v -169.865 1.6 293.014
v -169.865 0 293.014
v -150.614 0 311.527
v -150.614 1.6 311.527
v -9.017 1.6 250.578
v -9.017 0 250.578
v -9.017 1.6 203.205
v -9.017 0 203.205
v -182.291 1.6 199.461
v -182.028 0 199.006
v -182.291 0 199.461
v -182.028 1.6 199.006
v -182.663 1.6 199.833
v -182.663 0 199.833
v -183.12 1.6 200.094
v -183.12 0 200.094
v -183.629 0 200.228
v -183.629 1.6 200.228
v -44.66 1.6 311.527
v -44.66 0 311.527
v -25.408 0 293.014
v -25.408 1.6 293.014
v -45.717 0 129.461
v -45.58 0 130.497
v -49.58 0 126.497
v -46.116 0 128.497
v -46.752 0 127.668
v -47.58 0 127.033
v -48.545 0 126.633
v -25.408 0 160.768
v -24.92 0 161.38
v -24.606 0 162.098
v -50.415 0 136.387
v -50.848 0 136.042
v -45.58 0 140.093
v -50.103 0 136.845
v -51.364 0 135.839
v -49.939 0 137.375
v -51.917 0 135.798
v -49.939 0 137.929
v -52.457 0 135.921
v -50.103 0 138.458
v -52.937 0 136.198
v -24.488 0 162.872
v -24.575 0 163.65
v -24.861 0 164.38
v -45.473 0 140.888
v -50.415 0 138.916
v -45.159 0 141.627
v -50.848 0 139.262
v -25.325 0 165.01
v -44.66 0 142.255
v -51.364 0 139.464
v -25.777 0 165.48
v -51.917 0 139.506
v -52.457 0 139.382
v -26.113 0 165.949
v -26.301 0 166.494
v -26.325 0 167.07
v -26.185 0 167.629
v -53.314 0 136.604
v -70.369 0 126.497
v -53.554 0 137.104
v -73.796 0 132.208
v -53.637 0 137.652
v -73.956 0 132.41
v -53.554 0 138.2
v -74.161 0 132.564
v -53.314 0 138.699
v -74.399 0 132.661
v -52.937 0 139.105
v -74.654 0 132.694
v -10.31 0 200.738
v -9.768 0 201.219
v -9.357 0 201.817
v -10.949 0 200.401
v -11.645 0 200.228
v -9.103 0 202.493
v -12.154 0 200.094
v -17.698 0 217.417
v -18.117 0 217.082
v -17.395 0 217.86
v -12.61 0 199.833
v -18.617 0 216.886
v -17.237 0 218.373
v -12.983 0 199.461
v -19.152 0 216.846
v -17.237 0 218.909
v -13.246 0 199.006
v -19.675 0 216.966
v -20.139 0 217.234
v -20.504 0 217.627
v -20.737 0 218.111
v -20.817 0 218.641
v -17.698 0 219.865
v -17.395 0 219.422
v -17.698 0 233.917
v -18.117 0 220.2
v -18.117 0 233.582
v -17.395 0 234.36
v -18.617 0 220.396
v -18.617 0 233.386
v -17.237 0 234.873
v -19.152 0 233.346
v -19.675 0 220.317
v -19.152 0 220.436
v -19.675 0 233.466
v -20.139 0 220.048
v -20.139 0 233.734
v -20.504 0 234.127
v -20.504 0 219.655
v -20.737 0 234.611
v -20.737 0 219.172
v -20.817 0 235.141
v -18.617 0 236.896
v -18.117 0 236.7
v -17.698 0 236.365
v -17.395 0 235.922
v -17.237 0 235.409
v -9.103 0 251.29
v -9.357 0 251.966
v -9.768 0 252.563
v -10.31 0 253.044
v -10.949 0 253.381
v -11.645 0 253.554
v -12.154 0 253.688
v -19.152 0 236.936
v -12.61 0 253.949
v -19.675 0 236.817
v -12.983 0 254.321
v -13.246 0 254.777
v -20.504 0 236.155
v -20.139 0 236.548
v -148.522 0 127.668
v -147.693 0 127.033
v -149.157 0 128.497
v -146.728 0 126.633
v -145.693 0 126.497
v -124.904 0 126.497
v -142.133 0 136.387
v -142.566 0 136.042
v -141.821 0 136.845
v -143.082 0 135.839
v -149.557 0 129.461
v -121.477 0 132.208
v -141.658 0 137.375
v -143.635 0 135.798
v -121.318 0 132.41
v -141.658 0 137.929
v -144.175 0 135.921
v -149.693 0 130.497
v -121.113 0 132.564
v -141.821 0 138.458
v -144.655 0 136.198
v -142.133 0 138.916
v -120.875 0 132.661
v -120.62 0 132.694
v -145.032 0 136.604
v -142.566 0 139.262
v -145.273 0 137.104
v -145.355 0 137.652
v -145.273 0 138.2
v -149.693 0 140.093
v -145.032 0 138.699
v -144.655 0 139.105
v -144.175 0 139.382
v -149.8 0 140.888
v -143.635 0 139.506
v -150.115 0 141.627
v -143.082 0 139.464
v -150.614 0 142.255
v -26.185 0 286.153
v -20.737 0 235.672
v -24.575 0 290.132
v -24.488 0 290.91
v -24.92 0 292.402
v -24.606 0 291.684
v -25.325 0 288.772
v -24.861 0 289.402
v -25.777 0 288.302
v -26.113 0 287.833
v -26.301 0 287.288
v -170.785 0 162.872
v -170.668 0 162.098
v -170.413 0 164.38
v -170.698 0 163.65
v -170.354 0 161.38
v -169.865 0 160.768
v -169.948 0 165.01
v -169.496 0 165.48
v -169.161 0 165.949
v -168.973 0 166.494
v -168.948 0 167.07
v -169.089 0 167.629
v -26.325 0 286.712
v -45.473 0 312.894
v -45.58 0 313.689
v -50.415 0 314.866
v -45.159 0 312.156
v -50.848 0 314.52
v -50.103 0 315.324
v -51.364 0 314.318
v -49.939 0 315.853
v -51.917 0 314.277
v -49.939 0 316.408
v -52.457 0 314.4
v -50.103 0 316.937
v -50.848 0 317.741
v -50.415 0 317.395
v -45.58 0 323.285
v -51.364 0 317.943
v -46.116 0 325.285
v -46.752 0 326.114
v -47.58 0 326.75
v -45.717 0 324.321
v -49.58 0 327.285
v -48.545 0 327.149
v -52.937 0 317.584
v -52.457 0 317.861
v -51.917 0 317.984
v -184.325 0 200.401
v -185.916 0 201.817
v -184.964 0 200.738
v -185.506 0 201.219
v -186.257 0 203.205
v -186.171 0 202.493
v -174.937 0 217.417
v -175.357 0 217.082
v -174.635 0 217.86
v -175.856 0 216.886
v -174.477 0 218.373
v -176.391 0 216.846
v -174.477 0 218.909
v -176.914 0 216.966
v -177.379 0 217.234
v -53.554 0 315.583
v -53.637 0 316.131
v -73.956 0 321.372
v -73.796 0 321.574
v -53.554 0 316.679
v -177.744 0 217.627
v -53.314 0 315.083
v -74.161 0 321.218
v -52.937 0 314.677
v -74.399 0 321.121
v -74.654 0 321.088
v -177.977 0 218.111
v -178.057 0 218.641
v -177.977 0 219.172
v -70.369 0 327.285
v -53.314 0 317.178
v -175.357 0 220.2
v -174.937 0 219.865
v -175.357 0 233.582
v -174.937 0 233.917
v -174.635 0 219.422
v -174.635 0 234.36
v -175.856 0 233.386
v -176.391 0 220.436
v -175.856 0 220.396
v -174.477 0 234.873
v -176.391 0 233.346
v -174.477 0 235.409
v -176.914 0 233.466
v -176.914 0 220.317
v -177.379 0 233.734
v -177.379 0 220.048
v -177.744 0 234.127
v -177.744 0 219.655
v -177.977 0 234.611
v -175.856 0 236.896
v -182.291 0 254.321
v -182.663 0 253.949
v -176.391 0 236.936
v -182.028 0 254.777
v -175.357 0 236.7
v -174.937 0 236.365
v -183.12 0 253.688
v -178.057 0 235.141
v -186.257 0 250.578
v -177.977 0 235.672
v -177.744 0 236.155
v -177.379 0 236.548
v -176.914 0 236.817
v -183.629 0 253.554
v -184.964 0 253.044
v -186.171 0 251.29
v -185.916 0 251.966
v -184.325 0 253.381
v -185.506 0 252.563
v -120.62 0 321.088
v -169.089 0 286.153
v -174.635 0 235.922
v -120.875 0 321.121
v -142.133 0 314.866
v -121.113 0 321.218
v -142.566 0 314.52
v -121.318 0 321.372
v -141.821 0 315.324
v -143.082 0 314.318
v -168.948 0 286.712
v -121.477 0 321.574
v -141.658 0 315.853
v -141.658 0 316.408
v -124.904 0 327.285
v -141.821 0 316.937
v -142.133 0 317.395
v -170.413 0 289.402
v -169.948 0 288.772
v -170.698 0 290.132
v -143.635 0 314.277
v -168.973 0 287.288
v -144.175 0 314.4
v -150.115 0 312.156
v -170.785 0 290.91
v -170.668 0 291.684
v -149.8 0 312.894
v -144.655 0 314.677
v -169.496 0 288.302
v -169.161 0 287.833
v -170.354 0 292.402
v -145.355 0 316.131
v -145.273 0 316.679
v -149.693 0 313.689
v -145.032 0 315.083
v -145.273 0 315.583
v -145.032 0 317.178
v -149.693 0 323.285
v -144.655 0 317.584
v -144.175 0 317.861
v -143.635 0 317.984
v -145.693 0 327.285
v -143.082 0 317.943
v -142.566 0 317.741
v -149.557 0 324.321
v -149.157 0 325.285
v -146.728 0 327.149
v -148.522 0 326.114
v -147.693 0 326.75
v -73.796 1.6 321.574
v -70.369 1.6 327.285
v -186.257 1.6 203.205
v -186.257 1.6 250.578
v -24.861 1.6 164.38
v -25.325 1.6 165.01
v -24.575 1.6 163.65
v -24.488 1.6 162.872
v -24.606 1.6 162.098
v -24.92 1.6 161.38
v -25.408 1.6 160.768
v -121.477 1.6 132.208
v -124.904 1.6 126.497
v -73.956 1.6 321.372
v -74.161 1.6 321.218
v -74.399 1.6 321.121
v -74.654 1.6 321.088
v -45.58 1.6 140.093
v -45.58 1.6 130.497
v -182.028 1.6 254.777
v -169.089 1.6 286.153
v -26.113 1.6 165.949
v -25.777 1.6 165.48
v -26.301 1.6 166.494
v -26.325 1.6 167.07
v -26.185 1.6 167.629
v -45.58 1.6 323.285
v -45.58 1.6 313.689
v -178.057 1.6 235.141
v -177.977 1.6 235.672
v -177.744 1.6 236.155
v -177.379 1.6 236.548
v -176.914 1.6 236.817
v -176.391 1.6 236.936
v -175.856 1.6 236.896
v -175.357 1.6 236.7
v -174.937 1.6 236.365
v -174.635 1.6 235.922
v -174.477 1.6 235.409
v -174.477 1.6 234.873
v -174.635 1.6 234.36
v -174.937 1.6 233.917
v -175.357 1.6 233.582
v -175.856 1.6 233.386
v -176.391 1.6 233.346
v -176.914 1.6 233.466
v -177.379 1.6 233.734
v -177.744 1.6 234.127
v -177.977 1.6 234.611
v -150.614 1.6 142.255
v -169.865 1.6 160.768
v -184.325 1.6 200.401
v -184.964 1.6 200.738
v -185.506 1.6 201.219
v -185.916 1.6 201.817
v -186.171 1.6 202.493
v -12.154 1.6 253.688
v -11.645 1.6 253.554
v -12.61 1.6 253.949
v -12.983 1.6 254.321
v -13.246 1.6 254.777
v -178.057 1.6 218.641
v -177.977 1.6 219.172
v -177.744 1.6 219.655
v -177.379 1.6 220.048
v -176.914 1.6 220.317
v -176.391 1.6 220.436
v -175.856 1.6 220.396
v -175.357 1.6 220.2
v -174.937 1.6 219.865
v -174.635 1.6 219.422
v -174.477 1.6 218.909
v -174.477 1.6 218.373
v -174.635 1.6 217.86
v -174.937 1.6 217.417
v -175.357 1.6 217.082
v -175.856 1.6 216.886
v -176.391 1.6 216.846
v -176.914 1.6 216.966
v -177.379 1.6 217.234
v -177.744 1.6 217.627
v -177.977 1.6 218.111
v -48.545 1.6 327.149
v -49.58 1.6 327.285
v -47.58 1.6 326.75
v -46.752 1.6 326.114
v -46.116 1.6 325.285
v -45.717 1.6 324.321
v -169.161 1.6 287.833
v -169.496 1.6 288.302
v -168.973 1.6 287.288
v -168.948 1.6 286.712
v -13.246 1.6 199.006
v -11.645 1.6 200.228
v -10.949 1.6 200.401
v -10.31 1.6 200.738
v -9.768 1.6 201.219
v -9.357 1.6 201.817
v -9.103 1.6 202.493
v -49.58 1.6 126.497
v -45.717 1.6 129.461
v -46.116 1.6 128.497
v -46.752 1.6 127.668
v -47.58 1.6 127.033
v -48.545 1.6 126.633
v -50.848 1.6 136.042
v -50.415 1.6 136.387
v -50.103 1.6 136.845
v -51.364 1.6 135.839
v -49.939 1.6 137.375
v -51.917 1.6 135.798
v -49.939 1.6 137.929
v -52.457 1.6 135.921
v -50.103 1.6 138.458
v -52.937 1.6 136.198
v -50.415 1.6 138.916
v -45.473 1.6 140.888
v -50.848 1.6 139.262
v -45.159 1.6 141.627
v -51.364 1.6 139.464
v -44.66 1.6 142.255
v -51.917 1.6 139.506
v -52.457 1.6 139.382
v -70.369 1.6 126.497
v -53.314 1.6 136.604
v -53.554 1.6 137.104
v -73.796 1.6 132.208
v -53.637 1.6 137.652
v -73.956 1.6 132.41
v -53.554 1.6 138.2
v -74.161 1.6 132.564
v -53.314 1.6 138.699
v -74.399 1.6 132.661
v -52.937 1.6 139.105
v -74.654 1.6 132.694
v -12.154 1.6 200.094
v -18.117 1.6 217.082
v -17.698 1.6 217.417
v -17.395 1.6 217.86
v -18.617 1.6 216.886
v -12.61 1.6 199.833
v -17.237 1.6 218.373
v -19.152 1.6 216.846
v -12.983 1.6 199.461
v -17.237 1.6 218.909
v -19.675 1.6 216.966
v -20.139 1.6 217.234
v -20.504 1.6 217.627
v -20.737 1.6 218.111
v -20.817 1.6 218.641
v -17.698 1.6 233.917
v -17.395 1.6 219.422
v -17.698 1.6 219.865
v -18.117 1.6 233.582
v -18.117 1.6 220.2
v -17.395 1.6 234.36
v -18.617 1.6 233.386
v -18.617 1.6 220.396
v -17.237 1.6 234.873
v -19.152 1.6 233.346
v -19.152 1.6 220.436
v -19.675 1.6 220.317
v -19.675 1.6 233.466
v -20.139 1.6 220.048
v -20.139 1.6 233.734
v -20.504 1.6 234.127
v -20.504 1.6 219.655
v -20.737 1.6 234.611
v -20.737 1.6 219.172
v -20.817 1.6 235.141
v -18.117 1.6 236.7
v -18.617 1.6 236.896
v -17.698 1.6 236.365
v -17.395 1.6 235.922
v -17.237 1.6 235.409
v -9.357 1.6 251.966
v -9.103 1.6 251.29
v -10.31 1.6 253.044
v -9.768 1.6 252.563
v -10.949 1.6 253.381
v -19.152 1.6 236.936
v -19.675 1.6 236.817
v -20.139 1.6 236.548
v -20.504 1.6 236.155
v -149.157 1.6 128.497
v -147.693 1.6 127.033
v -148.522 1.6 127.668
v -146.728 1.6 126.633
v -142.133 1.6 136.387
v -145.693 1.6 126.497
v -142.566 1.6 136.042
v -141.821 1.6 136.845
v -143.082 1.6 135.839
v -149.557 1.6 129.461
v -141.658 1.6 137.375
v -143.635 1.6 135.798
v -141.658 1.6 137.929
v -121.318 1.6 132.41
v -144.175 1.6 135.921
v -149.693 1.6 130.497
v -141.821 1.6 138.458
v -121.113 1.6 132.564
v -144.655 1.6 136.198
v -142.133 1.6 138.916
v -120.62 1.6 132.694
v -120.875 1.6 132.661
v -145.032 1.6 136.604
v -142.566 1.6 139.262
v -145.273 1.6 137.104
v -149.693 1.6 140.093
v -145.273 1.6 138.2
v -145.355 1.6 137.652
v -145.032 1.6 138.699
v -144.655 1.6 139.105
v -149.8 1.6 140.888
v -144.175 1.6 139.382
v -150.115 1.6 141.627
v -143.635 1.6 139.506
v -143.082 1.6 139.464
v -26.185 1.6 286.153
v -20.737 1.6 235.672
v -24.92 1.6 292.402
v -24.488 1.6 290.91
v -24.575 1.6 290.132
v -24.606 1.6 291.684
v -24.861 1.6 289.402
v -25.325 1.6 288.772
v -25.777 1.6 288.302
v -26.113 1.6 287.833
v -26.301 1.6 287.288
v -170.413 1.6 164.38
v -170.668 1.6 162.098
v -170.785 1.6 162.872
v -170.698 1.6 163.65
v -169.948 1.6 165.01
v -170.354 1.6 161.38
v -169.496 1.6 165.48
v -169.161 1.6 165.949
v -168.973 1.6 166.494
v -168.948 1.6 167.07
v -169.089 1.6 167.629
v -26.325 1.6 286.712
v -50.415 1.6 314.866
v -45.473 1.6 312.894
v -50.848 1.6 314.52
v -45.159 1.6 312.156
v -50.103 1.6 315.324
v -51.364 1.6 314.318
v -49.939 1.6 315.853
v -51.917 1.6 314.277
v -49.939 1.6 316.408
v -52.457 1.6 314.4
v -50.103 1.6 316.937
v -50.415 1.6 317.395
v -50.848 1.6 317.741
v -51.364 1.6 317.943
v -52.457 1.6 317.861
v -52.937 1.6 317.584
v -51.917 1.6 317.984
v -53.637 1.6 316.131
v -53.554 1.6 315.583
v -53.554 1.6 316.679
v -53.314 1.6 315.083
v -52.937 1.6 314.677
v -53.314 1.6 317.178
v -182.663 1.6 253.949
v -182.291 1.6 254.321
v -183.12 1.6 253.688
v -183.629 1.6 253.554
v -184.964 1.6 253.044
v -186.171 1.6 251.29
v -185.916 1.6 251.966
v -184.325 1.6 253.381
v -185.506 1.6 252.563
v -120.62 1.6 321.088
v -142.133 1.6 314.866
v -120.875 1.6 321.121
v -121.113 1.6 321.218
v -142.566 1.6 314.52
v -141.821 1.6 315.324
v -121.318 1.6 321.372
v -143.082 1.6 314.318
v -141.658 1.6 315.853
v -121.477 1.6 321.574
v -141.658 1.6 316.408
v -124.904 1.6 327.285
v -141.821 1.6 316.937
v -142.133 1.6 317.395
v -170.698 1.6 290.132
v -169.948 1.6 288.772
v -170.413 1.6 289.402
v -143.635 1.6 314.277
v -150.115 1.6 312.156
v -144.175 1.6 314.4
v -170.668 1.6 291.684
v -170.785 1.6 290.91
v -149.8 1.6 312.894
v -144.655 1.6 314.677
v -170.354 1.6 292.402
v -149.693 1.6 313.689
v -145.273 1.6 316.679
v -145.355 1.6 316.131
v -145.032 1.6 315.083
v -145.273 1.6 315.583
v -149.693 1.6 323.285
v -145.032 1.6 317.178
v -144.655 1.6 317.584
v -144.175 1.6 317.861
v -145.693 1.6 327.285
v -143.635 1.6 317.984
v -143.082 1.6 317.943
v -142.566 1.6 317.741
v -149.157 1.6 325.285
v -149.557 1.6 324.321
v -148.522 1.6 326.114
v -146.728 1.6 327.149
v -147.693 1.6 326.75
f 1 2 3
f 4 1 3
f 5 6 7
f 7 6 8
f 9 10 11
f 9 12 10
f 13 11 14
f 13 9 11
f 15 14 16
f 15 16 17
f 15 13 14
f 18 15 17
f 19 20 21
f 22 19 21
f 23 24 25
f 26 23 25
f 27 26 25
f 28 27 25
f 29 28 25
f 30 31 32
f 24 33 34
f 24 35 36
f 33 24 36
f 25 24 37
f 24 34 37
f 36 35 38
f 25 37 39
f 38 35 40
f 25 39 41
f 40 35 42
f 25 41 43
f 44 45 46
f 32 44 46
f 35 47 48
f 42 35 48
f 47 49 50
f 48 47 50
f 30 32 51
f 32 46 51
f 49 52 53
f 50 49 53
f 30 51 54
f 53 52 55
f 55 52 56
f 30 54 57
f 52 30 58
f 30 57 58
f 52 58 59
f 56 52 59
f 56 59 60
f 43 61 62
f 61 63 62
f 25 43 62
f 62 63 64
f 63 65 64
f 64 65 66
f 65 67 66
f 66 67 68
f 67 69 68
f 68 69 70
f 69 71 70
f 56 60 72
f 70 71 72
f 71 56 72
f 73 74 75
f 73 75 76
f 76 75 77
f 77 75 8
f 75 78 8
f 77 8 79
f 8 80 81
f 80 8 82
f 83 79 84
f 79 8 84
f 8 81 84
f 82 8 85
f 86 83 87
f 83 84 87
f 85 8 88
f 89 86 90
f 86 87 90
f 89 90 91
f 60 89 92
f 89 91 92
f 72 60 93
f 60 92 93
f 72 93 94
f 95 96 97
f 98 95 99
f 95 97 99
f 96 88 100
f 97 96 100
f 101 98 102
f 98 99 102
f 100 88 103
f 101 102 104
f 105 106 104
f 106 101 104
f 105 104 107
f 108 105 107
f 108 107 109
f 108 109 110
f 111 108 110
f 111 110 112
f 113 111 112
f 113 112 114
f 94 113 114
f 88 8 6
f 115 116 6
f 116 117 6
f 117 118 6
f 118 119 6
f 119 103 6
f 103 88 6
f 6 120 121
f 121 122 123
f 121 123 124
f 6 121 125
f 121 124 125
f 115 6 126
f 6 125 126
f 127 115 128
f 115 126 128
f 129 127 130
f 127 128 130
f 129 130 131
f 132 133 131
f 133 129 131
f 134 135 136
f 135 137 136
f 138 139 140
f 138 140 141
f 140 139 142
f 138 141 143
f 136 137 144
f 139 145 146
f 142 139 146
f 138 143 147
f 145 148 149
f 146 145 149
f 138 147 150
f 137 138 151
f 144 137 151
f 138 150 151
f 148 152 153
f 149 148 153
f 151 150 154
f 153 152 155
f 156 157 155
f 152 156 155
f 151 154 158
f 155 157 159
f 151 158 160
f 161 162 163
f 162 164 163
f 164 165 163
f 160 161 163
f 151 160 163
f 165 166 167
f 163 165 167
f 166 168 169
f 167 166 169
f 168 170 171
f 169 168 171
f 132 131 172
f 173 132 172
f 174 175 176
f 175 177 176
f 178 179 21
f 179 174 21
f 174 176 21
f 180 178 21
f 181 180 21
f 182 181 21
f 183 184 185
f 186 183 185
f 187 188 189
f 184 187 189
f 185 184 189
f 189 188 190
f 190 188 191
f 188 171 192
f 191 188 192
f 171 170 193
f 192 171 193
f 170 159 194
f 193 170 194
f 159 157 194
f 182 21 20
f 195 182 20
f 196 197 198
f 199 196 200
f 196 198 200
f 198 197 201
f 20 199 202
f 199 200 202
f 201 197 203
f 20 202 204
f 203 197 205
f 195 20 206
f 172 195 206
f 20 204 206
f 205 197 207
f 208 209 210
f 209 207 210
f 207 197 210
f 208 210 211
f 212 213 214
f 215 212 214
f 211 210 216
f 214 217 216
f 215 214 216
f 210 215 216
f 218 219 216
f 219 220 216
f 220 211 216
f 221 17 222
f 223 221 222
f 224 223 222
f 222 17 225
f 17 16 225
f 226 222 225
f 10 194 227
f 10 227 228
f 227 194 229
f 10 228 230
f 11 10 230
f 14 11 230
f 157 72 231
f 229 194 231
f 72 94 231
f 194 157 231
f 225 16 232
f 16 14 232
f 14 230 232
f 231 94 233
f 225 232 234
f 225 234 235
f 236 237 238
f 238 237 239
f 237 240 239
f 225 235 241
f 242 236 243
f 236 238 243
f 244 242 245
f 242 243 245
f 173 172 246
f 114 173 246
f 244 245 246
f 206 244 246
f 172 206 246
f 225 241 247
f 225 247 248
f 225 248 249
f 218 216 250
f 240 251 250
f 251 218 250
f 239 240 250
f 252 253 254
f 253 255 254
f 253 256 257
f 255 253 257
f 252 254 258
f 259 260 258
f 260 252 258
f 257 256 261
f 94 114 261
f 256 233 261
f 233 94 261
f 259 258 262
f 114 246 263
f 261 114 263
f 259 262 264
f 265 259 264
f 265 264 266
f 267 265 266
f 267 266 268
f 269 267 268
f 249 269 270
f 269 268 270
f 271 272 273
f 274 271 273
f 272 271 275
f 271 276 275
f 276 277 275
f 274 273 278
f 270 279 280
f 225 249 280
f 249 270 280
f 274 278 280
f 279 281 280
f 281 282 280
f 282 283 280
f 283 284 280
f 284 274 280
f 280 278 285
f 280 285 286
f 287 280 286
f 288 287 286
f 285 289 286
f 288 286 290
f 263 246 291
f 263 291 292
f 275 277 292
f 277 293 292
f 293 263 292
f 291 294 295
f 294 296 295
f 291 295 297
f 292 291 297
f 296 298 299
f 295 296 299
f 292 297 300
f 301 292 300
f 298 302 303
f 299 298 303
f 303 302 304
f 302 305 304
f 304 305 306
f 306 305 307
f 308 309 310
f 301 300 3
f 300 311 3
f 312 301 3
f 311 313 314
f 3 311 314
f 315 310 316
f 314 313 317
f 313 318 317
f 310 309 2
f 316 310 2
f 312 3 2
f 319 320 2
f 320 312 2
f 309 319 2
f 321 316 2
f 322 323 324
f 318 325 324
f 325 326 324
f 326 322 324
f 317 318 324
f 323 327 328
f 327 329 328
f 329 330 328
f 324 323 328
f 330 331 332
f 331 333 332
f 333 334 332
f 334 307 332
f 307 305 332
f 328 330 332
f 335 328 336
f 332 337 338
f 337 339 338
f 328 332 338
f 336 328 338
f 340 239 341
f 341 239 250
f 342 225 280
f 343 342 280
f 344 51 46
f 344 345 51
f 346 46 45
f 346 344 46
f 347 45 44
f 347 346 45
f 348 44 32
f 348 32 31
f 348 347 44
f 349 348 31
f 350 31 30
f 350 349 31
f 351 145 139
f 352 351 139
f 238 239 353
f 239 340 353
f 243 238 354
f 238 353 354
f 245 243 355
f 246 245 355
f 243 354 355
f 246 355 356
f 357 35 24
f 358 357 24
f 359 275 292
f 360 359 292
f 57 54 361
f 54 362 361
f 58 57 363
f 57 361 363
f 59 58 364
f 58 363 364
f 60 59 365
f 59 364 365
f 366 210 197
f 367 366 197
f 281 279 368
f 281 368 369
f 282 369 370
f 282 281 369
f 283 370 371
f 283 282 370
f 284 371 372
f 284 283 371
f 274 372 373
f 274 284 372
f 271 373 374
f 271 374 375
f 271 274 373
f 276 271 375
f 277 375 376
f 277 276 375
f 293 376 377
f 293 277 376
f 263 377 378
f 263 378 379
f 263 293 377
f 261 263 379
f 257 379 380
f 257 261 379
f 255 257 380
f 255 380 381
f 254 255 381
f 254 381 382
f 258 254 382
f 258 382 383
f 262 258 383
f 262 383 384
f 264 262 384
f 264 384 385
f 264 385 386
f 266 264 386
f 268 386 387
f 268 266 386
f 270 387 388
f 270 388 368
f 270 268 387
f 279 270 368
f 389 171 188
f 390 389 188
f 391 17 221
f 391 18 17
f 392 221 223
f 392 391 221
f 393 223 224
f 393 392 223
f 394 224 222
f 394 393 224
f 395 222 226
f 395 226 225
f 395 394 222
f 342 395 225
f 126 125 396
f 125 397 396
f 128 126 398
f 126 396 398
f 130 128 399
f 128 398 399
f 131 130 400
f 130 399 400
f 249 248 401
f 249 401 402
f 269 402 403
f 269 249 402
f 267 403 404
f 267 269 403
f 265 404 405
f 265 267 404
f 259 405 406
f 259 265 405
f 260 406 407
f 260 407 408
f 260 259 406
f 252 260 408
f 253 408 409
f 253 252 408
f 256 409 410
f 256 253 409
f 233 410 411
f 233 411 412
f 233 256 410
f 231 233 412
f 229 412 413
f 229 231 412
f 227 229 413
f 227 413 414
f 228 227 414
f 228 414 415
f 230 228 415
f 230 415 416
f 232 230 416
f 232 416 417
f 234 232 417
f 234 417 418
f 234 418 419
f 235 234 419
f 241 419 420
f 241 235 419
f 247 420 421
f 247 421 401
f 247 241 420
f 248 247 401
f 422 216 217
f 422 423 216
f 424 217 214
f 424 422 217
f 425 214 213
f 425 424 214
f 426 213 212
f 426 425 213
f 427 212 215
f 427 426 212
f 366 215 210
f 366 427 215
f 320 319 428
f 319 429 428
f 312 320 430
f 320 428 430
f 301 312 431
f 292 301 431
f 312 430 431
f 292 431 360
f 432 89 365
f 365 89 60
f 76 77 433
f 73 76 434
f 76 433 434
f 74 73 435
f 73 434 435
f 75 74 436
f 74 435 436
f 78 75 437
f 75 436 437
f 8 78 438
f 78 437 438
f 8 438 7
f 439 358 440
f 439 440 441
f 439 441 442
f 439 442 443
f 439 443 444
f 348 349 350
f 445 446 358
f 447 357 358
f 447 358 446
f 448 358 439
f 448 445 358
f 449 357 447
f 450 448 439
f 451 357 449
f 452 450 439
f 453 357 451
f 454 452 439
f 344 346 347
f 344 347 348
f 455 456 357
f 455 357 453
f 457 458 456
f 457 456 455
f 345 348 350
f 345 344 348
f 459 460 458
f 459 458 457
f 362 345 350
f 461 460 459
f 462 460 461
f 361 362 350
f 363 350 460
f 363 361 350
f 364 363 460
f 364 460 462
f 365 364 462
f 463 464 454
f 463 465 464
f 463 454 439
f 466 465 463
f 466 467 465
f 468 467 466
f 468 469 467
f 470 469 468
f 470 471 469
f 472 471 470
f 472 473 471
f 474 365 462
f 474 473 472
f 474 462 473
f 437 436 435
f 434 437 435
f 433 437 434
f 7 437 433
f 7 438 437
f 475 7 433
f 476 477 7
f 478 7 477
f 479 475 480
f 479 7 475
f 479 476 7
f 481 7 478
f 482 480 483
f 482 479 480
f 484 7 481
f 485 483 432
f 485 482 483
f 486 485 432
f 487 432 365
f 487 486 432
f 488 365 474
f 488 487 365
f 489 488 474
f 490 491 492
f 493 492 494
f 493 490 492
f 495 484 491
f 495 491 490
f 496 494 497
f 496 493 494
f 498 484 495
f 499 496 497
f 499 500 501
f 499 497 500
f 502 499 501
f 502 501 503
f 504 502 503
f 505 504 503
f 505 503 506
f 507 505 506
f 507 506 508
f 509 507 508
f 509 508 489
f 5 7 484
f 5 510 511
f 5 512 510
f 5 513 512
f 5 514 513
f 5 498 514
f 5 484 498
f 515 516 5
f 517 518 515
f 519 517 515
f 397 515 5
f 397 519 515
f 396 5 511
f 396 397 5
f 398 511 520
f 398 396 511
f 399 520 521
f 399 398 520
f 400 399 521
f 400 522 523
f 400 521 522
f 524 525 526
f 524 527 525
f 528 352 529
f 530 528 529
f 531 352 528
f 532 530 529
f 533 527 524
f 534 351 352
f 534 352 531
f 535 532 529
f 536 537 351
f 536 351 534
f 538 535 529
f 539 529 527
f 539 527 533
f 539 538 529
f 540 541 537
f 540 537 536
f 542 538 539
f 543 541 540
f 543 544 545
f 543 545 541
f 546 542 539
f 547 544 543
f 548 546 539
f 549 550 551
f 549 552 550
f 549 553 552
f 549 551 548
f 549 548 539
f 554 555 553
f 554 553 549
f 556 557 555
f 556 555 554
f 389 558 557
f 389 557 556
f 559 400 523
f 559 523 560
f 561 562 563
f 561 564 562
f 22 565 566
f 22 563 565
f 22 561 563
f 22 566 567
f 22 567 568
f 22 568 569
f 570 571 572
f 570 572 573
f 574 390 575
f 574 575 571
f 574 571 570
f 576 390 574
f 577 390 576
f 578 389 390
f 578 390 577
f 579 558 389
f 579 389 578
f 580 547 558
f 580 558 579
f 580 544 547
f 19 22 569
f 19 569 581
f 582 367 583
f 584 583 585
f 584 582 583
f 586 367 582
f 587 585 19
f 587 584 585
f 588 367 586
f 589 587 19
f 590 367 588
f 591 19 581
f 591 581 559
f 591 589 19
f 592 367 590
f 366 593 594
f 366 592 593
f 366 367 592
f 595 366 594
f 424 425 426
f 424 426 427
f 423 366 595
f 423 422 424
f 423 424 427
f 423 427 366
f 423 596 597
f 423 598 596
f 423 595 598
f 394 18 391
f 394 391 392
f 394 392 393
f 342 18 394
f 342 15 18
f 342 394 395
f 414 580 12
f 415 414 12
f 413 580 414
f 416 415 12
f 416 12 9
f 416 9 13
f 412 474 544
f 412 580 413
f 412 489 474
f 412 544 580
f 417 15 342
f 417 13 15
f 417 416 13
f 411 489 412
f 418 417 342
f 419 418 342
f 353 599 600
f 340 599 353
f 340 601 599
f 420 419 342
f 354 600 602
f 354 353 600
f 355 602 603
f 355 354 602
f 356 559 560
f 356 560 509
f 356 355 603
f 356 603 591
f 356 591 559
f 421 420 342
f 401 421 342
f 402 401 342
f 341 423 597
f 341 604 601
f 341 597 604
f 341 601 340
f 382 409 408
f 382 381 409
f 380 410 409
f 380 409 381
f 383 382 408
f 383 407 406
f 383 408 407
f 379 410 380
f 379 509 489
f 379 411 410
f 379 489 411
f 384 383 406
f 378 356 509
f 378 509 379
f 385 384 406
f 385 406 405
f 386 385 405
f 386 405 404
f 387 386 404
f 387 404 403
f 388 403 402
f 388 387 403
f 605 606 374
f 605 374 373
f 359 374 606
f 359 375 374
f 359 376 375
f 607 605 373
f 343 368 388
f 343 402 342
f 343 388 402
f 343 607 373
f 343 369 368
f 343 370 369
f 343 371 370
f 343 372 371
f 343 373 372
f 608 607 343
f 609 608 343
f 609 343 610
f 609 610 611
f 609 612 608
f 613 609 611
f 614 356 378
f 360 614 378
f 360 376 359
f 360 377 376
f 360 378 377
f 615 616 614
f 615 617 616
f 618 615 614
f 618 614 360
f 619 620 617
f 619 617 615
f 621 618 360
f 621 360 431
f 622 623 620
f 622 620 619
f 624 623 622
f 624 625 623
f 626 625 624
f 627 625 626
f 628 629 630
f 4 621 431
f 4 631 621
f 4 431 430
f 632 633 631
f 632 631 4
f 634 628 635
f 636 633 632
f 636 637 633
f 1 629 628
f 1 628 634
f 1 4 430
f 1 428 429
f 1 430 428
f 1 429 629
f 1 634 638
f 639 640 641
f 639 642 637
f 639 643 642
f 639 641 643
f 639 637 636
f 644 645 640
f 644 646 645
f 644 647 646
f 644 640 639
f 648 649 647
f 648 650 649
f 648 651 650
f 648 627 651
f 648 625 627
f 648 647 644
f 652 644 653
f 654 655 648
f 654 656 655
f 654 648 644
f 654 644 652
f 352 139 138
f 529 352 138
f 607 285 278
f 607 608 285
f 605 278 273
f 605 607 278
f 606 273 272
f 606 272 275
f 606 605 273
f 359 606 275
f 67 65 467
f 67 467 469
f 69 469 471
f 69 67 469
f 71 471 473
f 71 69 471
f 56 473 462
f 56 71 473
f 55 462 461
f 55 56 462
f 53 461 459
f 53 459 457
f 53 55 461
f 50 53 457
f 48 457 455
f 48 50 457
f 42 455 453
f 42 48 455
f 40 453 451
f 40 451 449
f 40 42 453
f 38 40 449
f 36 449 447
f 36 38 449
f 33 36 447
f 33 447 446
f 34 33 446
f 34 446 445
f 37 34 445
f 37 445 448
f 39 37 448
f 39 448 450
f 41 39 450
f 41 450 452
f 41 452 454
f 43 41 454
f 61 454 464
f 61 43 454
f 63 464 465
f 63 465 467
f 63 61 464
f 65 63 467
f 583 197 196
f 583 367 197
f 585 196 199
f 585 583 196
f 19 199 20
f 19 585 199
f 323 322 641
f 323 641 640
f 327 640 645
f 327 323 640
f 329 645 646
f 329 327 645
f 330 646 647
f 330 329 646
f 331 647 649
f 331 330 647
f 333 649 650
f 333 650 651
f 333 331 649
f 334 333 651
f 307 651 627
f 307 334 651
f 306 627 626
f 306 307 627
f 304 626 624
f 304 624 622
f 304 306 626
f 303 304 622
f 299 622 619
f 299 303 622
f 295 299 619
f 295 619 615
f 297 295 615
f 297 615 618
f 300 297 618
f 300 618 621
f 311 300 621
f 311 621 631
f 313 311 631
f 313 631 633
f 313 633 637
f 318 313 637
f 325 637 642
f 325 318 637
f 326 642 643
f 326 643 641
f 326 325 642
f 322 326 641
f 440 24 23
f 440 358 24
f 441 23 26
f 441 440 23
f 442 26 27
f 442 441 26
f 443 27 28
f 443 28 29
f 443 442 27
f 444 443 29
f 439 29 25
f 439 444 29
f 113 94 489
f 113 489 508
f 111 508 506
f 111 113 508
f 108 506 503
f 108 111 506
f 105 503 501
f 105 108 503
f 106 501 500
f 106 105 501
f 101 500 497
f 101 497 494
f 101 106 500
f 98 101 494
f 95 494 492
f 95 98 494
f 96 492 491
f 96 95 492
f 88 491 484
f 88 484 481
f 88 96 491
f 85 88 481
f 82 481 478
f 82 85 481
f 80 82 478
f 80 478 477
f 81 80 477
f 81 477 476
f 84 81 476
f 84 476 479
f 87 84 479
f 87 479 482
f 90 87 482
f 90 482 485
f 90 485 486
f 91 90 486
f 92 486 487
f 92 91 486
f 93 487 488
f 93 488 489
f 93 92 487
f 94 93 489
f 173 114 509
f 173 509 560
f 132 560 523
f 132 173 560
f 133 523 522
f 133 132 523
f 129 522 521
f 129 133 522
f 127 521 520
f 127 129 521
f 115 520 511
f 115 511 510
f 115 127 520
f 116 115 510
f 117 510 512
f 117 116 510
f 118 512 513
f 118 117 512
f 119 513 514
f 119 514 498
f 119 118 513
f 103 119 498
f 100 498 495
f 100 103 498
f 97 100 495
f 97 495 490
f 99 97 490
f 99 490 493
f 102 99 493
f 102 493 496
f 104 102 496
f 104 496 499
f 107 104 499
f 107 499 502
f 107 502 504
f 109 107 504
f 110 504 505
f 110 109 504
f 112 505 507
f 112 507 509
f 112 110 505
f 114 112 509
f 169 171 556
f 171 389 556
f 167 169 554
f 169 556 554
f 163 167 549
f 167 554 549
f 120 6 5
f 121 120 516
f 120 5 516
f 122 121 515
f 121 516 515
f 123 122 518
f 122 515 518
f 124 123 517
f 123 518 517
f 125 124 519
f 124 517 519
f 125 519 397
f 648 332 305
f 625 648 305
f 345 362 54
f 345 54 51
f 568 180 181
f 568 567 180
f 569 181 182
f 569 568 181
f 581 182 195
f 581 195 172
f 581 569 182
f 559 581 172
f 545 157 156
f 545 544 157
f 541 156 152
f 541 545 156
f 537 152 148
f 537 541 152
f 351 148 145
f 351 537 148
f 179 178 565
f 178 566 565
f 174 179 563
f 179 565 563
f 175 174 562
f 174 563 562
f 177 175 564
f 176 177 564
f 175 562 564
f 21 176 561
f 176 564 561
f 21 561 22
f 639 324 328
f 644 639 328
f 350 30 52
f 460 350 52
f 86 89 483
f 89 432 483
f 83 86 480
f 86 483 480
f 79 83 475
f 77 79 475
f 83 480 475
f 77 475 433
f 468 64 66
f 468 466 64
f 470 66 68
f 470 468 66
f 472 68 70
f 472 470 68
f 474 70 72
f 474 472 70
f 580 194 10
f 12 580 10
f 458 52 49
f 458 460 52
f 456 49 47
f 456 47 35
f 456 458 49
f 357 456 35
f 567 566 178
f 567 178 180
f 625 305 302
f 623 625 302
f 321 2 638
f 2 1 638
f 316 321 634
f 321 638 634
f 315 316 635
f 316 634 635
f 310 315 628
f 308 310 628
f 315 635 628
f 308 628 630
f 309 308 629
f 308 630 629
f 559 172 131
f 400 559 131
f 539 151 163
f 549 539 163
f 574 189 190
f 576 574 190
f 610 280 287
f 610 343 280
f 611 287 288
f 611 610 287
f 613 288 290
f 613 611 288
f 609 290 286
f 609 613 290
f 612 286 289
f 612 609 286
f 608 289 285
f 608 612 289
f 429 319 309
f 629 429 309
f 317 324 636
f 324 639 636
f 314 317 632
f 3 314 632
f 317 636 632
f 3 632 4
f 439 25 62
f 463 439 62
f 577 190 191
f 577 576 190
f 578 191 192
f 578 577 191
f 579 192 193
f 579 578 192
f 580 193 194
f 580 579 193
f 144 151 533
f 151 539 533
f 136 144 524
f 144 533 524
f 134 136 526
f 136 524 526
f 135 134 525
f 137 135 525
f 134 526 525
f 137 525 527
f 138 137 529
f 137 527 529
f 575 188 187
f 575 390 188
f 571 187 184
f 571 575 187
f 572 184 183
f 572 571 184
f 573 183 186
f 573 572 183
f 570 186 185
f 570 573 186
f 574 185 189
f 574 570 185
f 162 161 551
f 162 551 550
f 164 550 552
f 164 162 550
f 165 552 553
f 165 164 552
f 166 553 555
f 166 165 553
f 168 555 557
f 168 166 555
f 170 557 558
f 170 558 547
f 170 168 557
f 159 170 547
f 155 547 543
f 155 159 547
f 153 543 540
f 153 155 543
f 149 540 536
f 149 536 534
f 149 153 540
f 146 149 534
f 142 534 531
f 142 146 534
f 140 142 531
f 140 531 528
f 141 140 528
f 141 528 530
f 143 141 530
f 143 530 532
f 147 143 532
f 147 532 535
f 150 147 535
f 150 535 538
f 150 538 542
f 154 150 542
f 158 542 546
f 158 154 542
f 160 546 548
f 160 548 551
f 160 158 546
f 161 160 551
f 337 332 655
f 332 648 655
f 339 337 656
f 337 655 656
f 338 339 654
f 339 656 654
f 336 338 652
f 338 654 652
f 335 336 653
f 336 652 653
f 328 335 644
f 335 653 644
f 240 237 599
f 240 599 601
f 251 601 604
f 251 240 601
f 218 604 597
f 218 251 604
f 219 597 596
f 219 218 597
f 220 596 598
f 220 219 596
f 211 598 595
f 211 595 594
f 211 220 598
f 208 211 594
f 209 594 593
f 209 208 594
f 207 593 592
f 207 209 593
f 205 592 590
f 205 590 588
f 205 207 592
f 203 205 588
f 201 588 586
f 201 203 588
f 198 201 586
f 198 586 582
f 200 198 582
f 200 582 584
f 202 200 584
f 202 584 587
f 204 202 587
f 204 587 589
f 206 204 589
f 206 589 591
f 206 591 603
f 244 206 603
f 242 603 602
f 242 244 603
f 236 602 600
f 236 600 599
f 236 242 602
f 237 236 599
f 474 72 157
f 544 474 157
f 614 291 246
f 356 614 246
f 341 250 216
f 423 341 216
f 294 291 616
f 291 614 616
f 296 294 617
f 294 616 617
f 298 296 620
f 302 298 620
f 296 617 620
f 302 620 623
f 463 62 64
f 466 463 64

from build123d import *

# Parameters (mm, degrees)
SKETCH1_R        = 1.8
SKETCH1_R_2      = 1.85915493
EXTRUSION1_DEPTH = 1.6
FILLET1_R        = 1
FILLET2_R        = 4
FILLET3_R        = 3
FILLET4_R        = 3
FILLET5_R        = 2
FILLET6_R        = 2
FILLET7_R        = 3
FILLET8_R        = 3
FILLET9_R        = 2
FILLET10_R       = 2
FILLET11_R       = 3


with BuildPart() as part:
    # Sketch1 → Extrusion1 (new body)
    with BuildSketch(Plane(origin=(0, 0, 0), x_dir=(-1, 0, 0), z_dir=(0, 1, 0))):
        Polygon((74.087520418, 321.088295015), (70.369210559, 327.285477572), (45.580478165, 327.285477572), (45.580478165, 312.412238135), (23.246043749, 290.934342561), (26.682507041, 287.360833055), (12.735407819, 253.538985229), (9.017097883, 253.538985229), (9.017097883, 226.891111382), (9.017097883, 200.243237534), (12.735407819, 200.243237534), (26.682507041, 166.421389708), (23.246043749, 162.847880202), (45.580478165, 141.369984628), (45.580478165, 126.496745191), (70.369210559, 126.496745191), (74.087520418, 132.693927748), (97.636816193, 132.693927748), (121.186111968, 132.693927748), (124.904421827, 126.496745191), (149.693154221, 126.496745191), (149.693154221, 141.369984628), (172.027588636, 162.847880202), (168.591125345, 166.421389708), (182.538224567, 200.243237534), (186.256534503, 200.243237534), (186.256534503, 226.891111382), (186.256534503, 253.538985229), (182.538224567, 253.538985229), (168.591125345, 287.360833055), (172.027588636, 290.934342561), (149.693154221, 312.412238135), (149.693154221, 327.285477572), (124.904421827, 327.285477572), (121.186111968, 321.088295015), (97.636816193, 321.088295015), align=None)
        with Locations((176.256534503, 218.641111382)):
            Circle(SKETCH1_R, mode=Mode.SUBTRACT)
        with Locations((176.256534503, 235.141111382)):
            Circle(SKETCH1_R, mode=Mode.SUBTRACT)
        with Locations((19.017097883, 218.641111382)):
            Circle(SKETCH1_R, mode=Mode.SUBTRACT)
        with Locations((19.017097883, 235.141111382)):
            Circle(SKETCH1_R, mode=Mode.SUBTRACT)
        with Locations((51.777661187, 316.130534525)):
            Circle(SKETCH1_R_2, mode=Mode.SUBTRACT)
        with Locations((143.495971199, 137.651688238)):
            Circle(SKETCH1_R_2, mode=Mode.SUBTRACT)
        with Locations((143.495971199, 316.130534525)):
            Circle(SKETCH1_R_2, mode=Mode.SUBTRACT)
        with Locations((51.777661187, 137.651688238)):
            Circle(SKETCH1_R_2, mode=Mode.SUBTRACT)
    extrude(amount=EXTRUSION1_DEPTH)

    # Fillet1
    fillet1_edges = [part.edges().sort_by_distance(p)[0] for p in [
        (-121.186111968, 0.8, 321.088295015),
        (-121.186111968, 0.8, 132.693927748),
        (-74.087520418, 0.8, 132.693927748),
        (-74.087520418, 0.8, 321.088295015),
    ]]
    fillet(fillet1_edges, radius=FILLET1_R)

    # Fillet2
    fillet2_edges = [part.edges().sort_by_distance(p)[0] for p in [
        (-149.693154221, 0.8, 327.285477572),
        (-149.693154221, 0.8, 126.496745191),
        (-45.580478165, 0.8, 126.496745191),
        (-45.580478165, 0.8, 327.285477572),
    ]]
    fillet(fillet2_edges, radius=FILLET2_R)

    # Fillet3
    fillet3_edges = [part.edges().sort_by_distance(p)[0] for p in [
        (-149.693154221, 0.8, 312.412238135),
        (-149.693154221, 0.8, 141.369984628),
        (-45.580478165, 0.8, 141.369984628),
        (-45.580478165, 0.8, 312.412238135),
    ]]
    fillet(fillet3_edges, radius=FILLET3_R)

    # Fillet4
    fillet4_edges = [part.edges().sort_by_distance(p)[0] for p in [
        (-172.027588636, 0.8, 290.934342561),
    ]]
    fillet(fillet4_edges, radius=FILLET4_R)

    # Fillet5
    fillet5_edges = [part.edges().sort_by_distance(p)[0] for p in [
        (-168.591125345, 0.8, 287.360833055),
    ]]
    fillet(fillet5_edges, radius=FILLET5_R)

    # Fillet6
    fillet6_edges = [part.edges().sort_by_distance(p)[0] for p in [
        (-26.682507041, 0.8, 287.360833055),
    ]]
    fillet(fillet6_edges, radius=FILLET6_R)

    # Fillet7
    fillet7_edges = [part.edges().sort_by_distance(p)[0] for p in [
        (-23.246043749, 0.8, 290.934342561),
    ]]
    fillet(fillet7_edges, radius=FILLET7_R)

    # Fillet8
    fillet8_edges = [part.edges().sort_by_distance(p)[0] for p in [
        (-172.027588636, 0.8, 162.847880202),
        (-23.246043749, 0.8, 162.847880202),
    ]]
    fillet(fillet8_edges, radius=FILLET8_R)

    # Fillet9
    fillet9_edges = [part.edges().sort_by_distance(p)[0] for p in [
        (-168.591125345, 0.8, 166.421389708),
        (-26.682507041, 0.8, 166.421389708),
    ]]
    fillet(fillet9_edges, radius=FILLET9_R)

    # Fillet10
    fillet10_edges = [part.edges().sort_by_distance(p)[0] for p in [
        (-182.538224567, 0.8, 253.538985229),
        (-182.538224567, 0.8, 200.243237534),
        (-12.735407819, 0.8, 200.243237534),
        (-12.735407819, 0.8, 253.538985229),
    ]]
    fillet(fillet10_edges, radius=FILLET10_R)

    # Fillet11
    fillet11_edges = [part.edges().sort_by_distance(p)[0] for p in [
        (-186.256534503, 0.8, 200.243237534),
        (-186.256534503, 0.8, 253.538985229),
        (-9.017097883, 0.8, 253.538985229),
        (-9.017097883, 0.8, 200.243237534),
    ]]
    fillet(fillet11_edges, radius=FILLET11_R)


solid = part.part
